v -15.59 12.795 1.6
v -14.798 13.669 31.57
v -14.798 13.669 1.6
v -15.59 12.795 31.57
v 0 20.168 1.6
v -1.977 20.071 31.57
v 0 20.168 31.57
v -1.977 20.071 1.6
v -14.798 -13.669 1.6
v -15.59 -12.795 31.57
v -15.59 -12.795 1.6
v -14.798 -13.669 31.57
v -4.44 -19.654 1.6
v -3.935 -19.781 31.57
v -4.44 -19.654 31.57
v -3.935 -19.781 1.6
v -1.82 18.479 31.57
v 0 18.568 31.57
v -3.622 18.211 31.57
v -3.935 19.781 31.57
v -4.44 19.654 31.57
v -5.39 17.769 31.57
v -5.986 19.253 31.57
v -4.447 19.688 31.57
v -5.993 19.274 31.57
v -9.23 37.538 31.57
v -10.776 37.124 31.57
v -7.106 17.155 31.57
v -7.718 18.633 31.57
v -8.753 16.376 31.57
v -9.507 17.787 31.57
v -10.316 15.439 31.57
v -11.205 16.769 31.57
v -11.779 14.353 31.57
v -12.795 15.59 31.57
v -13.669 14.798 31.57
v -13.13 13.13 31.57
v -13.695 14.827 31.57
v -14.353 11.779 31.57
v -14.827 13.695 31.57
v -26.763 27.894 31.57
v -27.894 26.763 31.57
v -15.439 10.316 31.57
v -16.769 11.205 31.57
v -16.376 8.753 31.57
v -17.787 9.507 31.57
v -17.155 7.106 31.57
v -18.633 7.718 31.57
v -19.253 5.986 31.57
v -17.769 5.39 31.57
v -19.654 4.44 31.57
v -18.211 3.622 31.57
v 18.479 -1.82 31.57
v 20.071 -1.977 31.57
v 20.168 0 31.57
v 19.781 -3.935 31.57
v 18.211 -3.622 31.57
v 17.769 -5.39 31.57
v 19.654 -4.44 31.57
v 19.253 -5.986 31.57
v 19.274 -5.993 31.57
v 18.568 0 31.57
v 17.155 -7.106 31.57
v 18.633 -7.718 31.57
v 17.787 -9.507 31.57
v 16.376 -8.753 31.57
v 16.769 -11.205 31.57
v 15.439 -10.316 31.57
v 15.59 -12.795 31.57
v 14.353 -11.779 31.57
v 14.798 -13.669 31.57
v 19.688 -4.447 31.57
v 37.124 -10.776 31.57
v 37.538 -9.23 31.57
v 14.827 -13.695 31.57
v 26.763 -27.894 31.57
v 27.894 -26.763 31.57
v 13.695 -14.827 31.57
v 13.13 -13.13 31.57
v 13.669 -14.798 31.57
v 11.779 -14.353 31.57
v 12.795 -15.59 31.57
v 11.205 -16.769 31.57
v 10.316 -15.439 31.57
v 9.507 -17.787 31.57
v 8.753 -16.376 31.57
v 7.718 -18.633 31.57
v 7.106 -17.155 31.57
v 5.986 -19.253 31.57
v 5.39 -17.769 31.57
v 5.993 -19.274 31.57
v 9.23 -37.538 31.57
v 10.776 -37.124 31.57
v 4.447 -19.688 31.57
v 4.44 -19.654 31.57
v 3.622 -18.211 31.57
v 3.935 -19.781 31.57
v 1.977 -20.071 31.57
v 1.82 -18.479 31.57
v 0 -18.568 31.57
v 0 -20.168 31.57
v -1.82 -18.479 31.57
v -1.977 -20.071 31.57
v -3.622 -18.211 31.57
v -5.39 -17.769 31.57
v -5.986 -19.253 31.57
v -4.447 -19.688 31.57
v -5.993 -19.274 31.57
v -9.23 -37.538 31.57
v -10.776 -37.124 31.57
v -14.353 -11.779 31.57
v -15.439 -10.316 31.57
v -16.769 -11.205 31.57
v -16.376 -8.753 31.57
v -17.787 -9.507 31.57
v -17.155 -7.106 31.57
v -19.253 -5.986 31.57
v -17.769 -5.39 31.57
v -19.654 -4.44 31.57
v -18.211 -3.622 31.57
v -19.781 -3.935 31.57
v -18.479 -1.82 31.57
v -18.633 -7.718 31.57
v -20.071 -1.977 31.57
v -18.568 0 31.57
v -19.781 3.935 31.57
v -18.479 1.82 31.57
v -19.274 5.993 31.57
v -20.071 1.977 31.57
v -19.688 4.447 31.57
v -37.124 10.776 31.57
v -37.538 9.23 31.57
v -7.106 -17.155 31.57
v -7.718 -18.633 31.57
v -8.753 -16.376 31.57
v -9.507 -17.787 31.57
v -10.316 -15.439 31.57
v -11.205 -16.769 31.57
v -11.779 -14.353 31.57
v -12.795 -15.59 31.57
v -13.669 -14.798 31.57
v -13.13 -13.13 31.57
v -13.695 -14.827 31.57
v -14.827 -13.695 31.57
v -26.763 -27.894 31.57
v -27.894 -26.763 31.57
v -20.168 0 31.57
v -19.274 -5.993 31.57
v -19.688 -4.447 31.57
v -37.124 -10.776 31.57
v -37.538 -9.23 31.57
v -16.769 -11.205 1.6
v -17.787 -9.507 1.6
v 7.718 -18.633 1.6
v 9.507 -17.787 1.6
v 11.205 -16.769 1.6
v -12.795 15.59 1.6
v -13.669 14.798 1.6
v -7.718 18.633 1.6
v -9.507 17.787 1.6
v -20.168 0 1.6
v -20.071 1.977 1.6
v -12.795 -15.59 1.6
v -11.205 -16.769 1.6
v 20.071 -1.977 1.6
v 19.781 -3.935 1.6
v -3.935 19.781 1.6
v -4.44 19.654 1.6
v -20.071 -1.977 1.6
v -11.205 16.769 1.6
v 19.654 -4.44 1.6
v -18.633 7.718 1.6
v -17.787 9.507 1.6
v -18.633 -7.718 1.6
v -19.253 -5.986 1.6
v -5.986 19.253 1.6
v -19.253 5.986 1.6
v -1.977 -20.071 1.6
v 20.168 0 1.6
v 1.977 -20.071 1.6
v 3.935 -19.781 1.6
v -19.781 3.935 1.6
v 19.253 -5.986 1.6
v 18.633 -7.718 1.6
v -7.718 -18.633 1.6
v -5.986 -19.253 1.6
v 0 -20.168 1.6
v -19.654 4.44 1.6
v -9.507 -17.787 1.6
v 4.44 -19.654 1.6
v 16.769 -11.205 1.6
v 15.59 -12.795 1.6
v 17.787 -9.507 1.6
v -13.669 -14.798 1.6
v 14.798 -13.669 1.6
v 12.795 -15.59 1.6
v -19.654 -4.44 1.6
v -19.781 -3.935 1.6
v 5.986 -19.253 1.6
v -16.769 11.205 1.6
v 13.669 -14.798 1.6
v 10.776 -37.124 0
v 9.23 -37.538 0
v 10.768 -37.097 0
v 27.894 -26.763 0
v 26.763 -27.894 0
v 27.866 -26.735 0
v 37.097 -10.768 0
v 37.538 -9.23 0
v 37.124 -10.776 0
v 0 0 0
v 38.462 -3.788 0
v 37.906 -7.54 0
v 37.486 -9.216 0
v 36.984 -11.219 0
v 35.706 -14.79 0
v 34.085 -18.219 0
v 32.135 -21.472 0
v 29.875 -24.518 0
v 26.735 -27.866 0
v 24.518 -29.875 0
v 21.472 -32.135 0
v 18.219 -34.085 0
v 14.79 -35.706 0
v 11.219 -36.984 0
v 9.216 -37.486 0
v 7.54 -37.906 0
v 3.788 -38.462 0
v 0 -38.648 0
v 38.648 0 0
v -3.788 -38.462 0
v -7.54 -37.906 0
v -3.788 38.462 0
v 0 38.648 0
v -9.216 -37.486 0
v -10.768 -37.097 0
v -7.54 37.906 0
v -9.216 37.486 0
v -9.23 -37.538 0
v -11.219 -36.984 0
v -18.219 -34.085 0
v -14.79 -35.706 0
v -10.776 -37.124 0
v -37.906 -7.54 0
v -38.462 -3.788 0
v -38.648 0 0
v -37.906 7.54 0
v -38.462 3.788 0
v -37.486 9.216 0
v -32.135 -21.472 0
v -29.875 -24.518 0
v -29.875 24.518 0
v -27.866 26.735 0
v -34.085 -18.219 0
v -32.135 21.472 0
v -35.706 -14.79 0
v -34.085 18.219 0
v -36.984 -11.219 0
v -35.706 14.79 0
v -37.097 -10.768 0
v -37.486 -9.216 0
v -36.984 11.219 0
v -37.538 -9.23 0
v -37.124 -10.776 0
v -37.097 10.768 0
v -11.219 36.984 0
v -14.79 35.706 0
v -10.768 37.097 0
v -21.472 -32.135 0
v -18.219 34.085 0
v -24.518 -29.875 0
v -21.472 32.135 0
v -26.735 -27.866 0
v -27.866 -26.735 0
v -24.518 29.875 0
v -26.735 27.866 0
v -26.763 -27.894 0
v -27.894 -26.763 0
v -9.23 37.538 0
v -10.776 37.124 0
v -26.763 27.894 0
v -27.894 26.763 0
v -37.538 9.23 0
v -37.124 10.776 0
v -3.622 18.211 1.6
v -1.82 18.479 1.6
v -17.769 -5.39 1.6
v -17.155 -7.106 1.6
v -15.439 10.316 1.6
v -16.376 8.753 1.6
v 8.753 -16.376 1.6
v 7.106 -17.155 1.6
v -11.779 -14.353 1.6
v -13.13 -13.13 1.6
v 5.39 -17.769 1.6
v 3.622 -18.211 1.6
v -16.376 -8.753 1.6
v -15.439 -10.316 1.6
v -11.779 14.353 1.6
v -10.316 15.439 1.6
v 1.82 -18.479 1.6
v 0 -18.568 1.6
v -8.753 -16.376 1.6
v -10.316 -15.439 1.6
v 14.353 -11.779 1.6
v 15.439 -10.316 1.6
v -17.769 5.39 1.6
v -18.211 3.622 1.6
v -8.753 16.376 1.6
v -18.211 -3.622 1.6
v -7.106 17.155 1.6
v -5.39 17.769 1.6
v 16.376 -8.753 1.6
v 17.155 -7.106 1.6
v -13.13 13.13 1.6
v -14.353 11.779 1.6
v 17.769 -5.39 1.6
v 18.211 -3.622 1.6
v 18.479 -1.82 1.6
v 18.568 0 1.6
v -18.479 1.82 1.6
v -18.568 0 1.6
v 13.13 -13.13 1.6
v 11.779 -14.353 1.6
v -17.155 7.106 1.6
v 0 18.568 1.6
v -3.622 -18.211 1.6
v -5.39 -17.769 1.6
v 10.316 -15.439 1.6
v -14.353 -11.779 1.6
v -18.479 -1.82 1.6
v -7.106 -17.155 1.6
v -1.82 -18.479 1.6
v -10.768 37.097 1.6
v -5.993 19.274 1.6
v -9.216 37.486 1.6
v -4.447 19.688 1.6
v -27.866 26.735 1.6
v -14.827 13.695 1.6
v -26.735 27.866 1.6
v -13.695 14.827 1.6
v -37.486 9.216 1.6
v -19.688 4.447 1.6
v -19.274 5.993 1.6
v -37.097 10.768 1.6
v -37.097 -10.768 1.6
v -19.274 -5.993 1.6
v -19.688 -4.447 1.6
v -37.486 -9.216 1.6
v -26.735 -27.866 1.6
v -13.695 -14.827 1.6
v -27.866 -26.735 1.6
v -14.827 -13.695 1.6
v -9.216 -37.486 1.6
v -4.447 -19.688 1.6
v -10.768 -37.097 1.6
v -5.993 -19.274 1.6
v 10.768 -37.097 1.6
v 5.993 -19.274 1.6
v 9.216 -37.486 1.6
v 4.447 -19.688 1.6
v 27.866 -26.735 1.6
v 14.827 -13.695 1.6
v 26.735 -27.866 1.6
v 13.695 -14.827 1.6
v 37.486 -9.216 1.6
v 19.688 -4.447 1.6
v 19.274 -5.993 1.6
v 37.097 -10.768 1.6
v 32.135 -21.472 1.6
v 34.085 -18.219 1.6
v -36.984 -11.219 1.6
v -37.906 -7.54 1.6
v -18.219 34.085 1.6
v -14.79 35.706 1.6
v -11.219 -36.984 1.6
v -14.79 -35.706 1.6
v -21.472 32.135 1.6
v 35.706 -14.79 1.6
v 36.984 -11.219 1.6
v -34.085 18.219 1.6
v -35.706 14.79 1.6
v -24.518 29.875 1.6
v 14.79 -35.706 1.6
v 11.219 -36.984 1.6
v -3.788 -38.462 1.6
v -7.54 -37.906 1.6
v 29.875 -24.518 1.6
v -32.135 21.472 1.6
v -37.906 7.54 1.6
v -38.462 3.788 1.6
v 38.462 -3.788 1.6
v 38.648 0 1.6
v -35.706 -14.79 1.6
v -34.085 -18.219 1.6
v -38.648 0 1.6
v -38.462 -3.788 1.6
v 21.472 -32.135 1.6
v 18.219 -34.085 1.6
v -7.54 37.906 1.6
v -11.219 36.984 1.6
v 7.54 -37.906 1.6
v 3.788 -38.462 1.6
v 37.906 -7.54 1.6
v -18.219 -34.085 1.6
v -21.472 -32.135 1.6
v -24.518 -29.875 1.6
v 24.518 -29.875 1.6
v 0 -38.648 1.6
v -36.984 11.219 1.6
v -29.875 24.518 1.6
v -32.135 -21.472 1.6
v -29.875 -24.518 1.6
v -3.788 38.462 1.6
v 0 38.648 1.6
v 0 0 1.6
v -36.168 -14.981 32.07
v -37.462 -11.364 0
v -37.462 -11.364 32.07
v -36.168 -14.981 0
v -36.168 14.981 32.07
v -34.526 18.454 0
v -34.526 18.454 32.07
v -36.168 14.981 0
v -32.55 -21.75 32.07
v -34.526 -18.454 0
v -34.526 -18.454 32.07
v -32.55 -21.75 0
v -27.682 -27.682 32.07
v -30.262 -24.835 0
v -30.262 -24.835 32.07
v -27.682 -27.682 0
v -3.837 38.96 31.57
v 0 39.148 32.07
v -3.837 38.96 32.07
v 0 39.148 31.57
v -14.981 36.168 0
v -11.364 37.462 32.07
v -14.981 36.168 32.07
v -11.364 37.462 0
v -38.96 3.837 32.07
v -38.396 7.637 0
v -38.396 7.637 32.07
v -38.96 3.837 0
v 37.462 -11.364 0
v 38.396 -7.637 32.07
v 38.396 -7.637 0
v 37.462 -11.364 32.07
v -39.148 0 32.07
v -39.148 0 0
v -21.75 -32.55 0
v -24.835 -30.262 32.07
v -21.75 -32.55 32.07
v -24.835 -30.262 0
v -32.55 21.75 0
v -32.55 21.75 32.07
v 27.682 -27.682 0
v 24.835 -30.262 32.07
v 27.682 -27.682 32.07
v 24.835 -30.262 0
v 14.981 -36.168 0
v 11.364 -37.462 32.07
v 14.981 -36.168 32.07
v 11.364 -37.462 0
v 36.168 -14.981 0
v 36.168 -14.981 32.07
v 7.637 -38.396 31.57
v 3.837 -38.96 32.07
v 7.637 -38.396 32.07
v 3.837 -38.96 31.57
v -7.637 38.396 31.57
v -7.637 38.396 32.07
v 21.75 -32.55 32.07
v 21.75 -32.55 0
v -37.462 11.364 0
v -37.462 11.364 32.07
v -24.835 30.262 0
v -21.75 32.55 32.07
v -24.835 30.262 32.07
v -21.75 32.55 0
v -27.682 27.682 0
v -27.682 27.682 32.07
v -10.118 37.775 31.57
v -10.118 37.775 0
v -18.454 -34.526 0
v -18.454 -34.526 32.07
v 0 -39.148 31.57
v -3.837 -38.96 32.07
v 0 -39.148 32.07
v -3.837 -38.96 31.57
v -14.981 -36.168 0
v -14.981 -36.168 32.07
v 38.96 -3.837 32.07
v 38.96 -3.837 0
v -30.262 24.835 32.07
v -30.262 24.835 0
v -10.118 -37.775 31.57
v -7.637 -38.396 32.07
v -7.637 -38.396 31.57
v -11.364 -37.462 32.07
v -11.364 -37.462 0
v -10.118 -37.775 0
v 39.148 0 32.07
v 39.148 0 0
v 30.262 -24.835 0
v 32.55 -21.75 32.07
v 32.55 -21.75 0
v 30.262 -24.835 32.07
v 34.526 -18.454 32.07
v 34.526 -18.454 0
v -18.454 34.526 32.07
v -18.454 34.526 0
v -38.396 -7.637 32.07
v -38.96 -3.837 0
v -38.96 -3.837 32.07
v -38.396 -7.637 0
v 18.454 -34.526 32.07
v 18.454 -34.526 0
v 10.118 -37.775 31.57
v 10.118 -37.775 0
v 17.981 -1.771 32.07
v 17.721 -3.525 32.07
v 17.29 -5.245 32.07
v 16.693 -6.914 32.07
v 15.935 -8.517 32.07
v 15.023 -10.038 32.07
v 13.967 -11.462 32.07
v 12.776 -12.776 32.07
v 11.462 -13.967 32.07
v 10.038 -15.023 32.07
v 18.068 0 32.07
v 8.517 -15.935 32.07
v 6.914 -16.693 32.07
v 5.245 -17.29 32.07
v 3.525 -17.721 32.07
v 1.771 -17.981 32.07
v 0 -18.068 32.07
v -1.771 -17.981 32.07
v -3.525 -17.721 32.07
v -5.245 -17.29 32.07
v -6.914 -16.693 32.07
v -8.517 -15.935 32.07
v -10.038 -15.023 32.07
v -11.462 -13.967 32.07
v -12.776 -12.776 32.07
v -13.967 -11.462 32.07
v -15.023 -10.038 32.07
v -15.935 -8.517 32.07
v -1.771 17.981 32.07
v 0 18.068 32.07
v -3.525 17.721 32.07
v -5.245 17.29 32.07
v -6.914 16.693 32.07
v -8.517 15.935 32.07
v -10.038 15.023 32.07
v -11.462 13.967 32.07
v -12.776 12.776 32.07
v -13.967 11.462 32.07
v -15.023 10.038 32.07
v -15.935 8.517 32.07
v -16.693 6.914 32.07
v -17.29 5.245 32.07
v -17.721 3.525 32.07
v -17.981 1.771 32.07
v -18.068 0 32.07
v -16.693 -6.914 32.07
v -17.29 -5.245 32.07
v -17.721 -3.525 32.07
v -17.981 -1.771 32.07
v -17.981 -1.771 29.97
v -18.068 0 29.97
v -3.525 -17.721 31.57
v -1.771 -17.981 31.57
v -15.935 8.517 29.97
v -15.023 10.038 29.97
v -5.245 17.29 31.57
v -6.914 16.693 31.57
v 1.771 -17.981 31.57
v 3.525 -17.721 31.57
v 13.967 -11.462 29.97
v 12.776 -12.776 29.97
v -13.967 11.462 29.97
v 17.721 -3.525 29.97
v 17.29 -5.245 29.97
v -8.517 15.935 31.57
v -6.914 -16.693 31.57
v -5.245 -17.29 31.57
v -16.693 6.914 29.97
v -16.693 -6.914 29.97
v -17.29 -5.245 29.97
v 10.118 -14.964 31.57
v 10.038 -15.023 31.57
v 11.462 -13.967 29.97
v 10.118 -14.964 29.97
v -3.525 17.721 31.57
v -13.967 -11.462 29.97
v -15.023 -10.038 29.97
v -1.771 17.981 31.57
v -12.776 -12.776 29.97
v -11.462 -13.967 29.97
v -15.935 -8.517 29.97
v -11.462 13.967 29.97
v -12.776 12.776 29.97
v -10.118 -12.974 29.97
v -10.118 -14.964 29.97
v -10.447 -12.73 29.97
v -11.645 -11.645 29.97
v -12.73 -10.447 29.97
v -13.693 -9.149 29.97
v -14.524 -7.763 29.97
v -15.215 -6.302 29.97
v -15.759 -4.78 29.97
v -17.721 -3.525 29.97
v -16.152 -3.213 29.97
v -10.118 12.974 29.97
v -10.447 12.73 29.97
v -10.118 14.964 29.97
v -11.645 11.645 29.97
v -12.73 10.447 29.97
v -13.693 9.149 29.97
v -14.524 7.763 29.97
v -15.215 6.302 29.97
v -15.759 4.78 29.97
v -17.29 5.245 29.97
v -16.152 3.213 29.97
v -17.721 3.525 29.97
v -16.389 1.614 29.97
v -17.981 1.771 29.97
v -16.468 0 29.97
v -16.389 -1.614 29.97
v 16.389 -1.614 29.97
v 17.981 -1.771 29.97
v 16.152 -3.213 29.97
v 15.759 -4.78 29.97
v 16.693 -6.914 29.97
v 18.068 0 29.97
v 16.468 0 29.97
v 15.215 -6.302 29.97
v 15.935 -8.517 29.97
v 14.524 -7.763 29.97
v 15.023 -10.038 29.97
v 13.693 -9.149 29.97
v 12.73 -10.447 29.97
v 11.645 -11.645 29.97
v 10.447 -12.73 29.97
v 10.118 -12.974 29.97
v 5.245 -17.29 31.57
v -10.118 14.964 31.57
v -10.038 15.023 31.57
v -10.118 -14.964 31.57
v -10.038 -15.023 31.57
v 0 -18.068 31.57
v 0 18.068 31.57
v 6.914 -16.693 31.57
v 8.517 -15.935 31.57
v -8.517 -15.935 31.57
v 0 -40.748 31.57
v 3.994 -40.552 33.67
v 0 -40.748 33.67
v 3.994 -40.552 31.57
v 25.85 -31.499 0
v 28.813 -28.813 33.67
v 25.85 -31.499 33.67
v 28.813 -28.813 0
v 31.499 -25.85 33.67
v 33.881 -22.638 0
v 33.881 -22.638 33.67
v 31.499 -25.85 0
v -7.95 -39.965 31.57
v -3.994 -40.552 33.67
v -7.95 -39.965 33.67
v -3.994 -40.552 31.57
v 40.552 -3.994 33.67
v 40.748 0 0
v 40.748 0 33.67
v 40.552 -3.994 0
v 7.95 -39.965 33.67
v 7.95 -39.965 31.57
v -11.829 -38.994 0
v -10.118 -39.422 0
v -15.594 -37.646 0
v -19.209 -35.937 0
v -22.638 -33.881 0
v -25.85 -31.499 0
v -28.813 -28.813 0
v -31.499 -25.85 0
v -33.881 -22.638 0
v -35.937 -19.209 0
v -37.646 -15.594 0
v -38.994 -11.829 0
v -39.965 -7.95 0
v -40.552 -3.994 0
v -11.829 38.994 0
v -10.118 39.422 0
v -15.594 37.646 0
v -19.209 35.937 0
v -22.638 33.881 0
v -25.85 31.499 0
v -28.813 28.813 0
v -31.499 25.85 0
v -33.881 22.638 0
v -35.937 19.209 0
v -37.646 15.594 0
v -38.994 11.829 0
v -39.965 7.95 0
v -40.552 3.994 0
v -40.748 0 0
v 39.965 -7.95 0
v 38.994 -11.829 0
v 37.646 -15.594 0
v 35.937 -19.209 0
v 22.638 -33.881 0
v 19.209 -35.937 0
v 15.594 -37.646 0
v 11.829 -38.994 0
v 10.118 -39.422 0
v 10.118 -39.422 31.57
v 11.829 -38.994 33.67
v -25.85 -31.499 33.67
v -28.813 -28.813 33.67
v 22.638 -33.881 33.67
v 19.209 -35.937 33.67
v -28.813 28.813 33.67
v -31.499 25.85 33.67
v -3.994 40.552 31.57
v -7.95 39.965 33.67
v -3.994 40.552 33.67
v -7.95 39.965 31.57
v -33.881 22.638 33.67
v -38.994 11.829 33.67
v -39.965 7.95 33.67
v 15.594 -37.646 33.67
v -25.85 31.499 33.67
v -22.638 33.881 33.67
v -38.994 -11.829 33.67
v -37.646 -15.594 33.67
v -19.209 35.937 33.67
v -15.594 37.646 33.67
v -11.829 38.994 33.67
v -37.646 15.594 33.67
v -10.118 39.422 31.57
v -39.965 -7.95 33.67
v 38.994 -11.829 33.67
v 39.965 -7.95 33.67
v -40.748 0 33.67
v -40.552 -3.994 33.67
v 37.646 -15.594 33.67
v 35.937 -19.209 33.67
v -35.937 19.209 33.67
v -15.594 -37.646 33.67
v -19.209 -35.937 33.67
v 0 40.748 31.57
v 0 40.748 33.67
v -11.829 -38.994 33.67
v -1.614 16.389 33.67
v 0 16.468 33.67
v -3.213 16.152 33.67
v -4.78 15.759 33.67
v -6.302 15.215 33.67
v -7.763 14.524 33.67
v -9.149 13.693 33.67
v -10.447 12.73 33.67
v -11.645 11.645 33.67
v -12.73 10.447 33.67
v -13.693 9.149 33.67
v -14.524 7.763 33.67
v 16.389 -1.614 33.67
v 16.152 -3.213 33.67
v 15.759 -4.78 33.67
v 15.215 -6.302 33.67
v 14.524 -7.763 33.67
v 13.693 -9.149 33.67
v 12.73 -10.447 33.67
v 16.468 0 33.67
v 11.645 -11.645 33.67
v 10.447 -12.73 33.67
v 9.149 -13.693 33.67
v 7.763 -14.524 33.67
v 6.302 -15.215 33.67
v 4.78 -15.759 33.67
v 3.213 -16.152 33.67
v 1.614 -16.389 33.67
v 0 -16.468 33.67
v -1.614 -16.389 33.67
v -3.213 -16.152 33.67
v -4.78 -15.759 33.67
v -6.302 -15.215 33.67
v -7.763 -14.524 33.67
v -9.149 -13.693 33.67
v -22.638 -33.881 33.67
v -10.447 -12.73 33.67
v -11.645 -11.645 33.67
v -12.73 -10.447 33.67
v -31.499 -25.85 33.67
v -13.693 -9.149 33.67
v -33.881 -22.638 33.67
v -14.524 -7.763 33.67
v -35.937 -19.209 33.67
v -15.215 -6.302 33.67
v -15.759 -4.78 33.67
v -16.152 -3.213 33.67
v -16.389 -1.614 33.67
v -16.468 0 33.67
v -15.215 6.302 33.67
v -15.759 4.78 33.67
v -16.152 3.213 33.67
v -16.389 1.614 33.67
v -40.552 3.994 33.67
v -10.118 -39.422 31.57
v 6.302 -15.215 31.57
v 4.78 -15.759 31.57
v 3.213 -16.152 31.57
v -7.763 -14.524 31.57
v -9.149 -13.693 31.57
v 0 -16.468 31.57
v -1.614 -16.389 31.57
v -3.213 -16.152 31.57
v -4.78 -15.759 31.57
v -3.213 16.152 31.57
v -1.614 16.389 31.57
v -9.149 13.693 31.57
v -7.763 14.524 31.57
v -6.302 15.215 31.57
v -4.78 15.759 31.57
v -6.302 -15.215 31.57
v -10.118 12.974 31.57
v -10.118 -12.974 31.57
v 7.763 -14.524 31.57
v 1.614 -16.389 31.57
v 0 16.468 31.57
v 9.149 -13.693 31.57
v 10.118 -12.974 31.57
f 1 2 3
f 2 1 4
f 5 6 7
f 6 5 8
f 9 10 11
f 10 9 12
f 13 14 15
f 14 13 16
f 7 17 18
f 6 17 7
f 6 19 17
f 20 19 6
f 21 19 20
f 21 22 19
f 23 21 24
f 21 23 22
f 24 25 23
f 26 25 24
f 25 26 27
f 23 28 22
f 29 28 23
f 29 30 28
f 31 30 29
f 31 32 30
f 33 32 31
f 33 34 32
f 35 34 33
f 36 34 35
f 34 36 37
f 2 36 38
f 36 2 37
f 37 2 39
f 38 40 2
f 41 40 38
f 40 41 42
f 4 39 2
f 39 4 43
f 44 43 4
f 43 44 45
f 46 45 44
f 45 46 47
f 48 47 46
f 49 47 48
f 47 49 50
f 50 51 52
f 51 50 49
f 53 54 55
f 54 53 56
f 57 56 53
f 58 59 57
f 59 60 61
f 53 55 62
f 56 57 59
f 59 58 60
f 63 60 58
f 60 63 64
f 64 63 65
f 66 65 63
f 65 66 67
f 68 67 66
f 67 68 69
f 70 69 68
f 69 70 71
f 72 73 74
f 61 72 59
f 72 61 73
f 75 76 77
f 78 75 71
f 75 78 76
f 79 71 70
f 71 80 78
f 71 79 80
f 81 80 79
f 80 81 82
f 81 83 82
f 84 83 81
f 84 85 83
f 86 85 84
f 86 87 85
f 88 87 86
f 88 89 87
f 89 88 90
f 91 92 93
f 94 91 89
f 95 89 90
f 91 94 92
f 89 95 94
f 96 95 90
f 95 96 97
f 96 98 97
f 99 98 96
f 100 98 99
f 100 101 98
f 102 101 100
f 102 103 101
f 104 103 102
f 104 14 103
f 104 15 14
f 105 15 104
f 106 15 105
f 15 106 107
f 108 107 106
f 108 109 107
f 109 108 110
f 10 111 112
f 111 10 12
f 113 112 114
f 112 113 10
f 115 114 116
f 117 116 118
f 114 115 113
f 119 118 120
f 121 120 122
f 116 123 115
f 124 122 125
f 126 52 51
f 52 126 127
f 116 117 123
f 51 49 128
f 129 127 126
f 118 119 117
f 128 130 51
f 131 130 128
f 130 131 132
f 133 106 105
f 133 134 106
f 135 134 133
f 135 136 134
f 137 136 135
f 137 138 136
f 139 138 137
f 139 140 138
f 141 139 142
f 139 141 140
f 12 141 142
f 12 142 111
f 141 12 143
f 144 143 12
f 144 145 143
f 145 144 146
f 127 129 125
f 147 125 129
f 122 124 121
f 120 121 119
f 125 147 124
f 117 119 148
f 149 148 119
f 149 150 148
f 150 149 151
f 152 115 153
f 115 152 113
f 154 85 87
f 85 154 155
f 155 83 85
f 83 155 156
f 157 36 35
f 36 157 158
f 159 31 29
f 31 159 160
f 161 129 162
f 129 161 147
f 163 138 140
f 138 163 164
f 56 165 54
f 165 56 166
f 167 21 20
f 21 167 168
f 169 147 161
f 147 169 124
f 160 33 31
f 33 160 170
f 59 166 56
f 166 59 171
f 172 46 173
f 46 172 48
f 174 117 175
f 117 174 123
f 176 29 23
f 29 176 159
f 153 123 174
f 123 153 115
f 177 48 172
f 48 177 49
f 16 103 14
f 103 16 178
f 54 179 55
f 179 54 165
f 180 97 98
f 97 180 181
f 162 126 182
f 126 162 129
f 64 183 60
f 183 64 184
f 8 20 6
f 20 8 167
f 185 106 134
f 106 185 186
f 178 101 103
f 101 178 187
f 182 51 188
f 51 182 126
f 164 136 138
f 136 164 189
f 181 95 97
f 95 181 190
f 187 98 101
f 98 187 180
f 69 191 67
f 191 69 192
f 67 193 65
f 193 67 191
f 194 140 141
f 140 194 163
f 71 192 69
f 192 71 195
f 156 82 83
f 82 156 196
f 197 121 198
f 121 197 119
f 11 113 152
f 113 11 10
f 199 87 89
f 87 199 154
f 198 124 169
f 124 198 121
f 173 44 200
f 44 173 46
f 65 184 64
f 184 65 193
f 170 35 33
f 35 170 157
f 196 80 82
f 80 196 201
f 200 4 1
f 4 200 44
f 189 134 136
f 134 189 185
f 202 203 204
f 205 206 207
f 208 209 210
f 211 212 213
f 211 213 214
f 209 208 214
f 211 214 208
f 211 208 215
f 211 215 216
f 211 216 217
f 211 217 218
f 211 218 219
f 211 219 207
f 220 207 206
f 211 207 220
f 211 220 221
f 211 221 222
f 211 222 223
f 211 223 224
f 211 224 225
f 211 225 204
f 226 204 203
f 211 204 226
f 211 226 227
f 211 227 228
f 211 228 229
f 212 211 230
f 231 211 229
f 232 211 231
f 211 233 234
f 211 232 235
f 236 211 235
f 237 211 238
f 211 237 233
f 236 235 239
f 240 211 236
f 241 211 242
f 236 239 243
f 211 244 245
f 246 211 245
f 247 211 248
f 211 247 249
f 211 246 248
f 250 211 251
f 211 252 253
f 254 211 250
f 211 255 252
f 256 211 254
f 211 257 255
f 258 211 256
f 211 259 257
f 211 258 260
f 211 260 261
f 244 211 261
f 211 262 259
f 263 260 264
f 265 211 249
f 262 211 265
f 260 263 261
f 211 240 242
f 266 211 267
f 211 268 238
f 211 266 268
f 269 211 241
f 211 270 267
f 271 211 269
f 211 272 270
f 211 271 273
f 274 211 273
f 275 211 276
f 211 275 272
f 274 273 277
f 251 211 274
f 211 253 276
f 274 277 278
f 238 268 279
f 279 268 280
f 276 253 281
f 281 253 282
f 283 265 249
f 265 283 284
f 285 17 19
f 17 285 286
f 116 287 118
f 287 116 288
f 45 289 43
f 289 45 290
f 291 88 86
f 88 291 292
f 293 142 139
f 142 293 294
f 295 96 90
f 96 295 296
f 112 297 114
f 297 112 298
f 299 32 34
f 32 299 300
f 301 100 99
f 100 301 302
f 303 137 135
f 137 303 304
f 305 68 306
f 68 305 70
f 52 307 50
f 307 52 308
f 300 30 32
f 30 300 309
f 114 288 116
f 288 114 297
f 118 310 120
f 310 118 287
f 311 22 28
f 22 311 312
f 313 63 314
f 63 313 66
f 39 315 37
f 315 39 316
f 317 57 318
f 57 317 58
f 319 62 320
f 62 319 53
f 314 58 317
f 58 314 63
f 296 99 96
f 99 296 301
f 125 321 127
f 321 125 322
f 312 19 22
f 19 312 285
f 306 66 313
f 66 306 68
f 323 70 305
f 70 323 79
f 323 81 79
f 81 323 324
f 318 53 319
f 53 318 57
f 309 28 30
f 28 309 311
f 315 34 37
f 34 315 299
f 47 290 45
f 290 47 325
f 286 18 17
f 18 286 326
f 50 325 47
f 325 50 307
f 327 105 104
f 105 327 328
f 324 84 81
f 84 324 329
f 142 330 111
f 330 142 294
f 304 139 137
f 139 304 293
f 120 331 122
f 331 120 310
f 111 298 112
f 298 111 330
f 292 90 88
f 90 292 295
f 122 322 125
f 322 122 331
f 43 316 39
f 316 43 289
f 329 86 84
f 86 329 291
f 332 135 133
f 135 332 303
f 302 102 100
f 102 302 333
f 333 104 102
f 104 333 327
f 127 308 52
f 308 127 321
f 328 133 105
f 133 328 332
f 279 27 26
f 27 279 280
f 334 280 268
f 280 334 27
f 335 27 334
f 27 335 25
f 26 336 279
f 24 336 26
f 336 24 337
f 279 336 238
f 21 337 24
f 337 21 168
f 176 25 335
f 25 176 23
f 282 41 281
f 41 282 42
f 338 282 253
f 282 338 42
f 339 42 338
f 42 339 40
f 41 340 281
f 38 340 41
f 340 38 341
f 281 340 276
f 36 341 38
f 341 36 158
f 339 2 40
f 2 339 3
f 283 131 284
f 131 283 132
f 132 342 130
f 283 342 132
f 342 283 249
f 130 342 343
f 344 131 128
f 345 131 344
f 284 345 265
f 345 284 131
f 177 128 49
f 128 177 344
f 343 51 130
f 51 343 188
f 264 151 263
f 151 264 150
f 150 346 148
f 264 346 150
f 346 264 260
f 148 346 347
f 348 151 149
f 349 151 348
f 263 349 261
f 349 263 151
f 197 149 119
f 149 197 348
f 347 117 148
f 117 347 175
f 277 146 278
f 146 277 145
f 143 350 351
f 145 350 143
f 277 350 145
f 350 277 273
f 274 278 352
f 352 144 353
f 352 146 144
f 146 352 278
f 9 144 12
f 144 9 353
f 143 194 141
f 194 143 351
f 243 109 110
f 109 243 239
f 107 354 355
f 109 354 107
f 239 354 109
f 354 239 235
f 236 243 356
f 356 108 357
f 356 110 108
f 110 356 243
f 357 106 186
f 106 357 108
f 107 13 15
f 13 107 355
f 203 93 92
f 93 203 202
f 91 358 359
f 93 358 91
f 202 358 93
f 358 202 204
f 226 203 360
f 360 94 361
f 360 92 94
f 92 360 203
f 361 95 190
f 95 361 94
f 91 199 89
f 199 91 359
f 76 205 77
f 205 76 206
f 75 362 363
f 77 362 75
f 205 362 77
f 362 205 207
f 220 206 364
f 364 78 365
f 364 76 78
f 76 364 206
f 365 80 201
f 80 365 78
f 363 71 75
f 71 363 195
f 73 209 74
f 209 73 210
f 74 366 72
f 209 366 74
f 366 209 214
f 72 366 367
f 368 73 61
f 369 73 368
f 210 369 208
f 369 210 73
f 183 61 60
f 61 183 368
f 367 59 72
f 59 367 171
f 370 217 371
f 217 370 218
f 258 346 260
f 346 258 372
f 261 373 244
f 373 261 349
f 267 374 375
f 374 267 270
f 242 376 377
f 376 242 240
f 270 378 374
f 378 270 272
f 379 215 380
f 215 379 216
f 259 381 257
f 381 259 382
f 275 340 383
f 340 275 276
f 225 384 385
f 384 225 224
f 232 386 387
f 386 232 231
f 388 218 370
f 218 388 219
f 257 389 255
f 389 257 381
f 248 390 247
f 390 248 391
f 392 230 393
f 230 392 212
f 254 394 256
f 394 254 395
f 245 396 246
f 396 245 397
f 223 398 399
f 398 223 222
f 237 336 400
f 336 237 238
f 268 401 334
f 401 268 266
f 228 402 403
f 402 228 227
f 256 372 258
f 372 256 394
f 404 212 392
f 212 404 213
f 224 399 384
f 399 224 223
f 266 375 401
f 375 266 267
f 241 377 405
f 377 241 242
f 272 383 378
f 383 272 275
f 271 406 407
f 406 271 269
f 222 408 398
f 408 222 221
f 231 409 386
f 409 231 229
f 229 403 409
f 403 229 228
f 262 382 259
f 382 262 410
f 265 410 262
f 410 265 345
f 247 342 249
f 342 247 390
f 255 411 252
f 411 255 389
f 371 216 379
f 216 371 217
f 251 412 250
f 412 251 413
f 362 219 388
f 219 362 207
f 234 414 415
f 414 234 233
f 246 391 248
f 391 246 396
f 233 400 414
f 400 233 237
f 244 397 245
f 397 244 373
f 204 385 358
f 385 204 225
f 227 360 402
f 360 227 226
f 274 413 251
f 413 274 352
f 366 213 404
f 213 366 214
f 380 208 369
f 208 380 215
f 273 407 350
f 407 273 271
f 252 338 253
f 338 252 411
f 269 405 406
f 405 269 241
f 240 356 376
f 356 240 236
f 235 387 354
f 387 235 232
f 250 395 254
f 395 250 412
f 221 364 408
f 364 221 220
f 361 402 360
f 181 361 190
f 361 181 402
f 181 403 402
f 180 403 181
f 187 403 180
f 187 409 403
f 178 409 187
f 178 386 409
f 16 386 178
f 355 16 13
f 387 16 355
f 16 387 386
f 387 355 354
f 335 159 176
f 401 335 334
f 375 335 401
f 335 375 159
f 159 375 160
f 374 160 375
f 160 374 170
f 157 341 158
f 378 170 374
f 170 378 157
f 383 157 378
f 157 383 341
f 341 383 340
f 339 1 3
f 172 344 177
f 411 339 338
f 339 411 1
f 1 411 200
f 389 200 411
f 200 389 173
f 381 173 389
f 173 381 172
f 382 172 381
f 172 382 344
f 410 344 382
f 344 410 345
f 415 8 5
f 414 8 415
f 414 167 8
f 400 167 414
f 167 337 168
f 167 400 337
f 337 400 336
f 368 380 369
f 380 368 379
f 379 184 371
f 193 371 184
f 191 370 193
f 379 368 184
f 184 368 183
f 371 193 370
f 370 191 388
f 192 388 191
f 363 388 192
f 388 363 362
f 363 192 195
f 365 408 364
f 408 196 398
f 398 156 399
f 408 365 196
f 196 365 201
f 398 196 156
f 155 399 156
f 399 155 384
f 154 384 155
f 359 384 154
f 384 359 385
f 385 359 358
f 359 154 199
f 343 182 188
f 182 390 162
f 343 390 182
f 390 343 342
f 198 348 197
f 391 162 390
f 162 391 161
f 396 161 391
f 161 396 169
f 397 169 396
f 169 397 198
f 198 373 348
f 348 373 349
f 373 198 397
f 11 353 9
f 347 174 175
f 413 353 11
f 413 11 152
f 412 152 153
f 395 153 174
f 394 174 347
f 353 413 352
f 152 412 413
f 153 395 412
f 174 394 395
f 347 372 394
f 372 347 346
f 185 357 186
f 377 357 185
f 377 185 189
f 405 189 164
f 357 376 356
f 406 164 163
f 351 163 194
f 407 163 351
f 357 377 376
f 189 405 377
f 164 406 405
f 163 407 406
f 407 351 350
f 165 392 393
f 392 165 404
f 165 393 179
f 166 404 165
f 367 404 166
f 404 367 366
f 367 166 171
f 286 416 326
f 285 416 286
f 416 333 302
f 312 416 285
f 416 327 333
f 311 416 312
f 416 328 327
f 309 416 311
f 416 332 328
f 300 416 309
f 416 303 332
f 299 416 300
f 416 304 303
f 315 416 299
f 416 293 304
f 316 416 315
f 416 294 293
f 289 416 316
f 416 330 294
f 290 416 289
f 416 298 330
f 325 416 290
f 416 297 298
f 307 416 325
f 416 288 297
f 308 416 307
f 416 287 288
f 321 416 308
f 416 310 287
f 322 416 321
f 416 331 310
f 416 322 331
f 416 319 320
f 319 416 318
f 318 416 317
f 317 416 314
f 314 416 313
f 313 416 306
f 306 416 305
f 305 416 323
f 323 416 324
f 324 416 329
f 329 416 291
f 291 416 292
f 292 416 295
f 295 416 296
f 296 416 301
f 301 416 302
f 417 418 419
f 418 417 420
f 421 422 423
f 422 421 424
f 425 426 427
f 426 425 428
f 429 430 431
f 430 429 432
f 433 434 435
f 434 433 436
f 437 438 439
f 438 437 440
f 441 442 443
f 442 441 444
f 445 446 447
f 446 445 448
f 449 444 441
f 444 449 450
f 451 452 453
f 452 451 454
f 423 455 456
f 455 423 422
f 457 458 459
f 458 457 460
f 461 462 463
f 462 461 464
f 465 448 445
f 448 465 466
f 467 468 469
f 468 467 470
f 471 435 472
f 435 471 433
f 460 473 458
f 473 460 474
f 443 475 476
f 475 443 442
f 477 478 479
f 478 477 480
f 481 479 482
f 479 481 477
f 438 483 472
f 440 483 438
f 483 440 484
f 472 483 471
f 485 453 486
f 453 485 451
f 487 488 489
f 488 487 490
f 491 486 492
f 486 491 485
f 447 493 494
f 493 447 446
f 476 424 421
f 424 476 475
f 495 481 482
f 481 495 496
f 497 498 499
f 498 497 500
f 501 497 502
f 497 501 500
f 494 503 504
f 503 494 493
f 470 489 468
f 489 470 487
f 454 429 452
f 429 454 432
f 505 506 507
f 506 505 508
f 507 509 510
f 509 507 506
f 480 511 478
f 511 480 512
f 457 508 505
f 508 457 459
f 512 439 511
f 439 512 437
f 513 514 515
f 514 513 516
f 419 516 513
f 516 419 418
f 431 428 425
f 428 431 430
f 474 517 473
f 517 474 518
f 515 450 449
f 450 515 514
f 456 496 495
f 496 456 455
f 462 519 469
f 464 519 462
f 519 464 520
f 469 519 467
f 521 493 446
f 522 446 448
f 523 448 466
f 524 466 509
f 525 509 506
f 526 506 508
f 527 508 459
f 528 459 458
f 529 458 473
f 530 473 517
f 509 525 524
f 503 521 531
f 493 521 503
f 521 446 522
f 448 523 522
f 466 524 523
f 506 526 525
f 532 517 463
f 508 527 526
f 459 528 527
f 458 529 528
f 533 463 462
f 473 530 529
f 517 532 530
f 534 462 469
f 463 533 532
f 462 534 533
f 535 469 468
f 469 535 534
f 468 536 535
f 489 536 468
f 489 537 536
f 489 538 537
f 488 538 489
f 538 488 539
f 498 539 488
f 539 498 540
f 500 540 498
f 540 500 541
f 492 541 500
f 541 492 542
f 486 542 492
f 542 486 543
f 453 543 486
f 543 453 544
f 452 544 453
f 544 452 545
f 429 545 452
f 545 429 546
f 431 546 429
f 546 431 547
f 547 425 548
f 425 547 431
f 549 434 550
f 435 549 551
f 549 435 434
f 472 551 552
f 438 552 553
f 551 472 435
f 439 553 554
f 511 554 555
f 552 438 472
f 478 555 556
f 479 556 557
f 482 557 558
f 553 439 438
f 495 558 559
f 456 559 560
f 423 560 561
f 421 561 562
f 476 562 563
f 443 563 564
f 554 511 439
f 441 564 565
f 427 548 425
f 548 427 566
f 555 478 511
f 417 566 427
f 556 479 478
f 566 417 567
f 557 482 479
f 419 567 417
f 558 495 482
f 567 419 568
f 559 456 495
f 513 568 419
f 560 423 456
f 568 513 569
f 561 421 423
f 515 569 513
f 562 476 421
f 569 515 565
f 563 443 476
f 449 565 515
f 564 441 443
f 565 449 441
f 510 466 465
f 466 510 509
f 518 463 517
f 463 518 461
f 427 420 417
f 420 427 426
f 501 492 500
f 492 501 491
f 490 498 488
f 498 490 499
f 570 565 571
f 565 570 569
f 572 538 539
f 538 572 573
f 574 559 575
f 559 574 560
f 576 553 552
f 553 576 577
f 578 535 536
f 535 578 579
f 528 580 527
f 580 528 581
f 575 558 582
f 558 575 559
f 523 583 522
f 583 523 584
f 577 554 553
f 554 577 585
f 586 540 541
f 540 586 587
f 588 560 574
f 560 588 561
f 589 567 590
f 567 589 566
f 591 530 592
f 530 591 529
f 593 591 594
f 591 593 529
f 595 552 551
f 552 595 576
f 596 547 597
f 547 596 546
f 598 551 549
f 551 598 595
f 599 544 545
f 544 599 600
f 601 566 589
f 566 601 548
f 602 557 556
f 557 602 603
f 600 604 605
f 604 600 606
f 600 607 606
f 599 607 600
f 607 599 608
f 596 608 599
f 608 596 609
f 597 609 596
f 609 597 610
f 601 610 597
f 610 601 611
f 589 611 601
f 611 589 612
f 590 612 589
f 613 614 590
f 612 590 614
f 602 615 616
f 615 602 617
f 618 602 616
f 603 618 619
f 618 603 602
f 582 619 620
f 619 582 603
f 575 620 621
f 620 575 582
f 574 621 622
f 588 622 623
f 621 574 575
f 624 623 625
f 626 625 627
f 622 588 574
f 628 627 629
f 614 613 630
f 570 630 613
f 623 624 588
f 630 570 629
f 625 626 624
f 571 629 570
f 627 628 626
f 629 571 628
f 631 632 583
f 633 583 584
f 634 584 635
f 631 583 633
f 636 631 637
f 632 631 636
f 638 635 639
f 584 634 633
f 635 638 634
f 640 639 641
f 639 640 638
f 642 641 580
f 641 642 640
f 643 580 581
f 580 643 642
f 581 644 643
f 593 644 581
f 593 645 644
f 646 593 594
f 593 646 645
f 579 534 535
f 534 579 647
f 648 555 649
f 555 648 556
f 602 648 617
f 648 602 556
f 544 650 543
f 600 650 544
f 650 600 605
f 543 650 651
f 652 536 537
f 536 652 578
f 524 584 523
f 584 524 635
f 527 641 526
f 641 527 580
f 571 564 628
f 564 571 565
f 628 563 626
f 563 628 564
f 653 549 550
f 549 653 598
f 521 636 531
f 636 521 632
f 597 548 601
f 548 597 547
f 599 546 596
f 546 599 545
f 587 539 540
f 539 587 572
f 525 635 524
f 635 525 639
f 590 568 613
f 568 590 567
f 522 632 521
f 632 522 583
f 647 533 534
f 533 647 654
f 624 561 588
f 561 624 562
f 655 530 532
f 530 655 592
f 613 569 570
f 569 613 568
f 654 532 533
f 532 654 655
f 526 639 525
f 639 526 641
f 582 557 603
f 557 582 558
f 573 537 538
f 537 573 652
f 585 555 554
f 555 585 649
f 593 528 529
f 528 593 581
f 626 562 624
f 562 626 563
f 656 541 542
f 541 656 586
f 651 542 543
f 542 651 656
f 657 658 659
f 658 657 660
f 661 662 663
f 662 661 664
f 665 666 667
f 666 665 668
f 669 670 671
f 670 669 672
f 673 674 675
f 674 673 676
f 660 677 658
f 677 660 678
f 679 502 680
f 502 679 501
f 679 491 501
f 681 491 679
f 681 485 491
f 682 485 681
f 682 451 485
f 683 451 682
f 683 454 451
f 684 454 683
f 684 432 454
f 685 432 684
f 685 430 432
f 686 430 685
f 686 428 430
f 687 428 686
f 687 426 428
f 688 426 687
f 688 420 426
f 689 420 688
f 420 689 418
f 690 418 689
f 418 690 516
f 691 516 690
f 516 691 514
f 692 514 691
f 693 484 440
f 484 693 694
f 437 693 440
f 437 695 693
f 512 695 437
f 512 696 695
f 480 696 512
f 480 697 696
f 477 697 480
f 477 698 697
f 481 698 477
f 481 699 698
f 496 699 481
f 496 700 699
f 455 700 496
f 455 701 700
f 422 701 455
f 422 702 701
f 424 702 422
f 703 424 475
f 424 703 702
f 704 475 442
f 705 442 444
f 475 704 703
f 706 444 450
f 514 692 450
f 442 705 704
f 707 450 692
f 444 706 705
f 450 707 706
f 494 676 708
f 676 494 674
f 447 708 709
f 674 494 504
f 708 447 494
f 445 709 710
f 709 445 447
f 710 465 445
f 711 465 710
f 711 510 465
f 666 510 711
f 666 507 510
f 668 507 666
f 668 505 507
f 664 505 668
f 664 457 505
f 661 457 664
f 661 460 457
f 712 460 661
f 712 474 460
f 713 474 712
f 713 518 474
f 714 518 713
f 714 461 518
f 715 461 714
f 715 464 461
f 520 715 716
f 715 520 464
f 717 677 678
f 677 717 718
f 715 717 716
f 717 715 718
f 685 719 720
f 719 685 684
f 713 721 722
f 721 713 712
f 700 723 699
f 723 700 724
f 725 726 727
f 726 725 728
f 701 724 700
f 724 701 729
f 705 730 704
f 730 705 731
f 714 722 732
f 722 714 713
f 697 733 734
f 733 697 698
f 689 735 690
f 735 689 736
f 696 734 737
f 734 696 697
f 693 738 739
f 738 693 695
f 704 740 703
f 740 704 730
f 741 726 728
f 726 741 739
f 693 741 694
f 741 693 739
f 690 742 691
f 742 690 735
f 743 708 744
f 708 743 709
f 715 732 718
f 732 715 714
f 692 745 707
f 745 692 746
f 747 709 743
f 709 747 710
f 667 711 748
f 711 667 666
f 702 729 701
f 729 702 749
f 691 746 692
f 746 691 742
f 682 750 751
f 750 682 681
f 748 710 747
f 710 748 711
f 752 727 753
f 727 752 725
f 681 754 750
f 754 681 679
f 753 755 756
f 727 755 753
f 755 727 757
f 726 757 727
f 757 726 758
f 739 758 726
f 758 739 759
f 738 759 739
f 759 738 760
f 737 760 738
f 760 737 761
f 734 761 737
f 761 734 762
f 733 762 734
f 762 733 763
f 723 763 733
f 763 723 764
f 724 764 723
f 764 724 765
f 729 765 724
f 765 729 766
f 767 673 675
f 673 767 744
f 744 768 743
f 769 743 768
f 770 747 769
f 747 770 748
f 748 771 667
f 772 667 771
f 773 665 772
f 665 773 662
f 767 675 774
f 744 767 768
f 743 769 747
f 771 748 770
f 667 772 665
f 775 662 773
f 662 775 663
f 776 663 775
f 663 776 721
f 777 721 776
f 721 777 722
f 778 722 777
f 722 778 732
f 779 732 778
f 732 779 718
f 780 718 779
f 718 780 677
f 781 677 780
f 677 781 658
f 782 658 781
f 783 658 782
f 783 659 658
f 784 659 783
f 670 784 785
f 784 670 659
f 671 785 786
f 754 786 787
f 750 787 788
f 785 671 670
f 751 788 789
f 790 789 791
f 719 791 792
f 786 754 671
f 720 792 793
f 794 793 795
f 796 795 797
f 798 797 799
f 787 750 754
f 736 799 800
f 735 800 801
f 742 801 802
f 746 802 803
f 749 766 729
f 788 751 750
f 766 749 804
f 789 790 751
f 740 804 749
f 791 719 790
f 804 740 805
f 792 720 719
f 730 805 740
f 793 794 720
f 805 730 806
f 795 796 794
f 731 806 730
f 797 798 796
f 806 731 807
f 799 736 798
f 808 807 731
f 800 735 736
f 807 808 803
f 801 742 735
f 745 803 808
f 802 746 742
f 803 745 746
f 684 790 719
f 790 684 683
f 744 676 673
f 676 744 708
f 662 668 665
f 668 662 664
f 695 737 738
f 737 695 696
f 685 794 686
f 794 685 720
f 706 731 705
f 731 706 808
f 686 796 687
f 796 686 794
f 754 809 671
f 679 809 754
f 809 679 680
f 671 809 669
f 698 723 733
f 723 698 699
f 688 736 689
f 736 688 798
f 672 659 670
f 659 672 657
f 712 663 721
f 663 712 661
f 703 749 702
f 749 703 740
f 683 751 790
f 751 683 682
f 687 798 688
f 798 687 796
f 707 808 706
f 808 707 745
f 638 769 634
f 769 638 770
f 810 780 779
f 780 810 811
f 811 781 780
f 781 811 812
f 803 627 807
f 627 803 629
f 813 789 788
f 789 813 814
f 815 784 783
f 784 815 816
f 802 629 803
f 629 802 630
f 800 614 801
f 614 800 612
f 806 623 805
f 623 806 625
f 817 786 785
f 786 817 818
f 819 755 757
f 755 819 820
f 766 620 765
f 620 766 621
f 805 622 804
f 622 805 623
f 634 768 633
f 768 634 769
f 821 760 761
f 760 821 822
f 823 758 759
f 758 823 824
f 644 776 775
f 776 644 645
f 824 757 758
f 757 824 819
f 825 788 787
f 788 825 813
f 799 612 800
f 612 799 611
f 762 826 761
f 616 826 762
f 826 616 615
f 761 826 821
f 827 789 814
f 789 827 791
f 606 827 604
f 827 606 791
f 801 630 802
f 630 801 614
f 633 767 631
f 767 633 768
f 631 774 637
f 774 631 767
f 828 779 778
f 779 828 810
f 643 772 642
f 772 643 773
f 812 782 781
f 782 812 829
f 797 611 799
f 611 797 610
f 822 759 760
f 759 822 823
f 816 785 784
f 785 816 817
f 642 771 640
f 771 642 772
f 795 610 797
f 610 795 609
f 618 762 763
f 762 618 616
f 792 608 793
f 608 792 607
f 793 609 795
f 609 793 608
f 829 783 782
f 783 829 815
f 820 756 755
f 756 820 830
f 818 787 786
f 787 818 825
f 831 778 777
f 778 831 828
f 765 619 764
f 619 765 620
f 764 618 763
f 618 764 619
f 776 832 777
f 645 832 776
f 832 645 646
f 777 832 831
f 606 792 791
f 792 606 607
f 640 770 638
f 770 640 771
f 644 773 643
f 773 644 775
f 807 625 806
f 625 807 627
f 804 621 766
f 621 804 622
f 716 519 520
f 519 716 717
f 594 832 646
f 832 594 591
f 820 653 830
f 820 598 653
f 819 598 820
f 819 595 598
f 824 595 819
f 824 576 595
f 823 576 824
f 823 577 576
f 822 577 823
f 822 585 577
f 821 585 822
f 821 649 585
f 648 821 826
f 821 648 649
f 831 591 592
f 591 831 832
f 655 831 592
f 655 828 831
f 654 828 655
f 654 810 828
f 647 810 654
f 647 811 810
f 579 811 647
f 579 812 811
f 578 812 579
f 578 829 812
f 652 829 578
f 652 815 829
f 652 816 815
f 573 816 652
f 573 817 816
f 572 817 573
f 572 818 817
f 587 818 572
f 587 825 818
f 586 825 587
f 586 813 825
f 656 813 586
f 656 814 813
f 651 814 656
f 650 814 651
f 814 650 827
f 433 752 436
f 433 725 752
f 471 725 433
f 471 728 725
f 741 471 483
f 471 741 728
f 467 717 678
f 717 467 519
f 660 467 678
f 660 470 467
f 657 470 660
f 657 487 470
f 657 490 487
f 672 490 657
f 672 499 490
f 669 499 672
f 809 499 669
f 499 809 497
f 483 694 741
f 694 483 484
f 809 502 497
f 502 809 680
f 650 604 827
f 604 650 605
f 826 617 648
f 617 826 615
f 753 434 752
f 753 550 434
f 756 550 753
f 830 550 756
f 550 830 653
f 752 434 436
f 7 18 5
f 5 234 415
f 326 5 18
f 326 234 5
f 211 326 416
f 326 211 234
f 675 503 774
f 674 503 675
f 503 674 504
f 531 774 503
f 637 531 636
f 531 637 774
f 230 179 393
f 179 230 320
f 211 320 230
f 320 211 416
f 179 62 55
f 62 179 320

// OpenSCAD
// file: 9g_servo.scad
//9g_motor();

//function    

function servo_9g_dim() =     [12.5,15.5,23+1];
function servo_9g_hole_off()=(27.4-servo_9g_dim()[2])/2;
function servo_9g_pin_off() = [23/2,12.5/2*0,22/2]+[5.5,0,3.65];

module 9g_motor(){
	translate([23/2,12.5/2*0,22/2])
//	translate([23/2,12.5/2,22/2])
	difference(){			
		union(){
			color("lightblue") cube([23,12.5,22], center=true);
			color("lightblue") translate([0,0,5]) cube([32,12,2], center=true);
			color("lightblue") translate([5.5,0,2.75]) cylinder(r=6, h=25.75, $fn=20, center=true);
			color("lightblue") translate([-.5,0,2.75]) cylinder(r=1, h=25.75, $fn=20, center=true);
			color("lightblue") translate([-1,0,2.75]) cube([5,5.6,24.5], center=true);		
			color("white") translate([5.5,0,3.65]) cylinder(r=2.35, h=29.25, $fn=20, center=true);		
          translate([10,0,-10+4.7])  
            color("red") cube([10,5,2],center=true);
		}
		translate([10,0,-11]) rotate([0,-30,0]) cube([8,13,4], center=true);
		for ( hole = [14,-14] ){
			translate([hole,0,5]) cylinder(r=2.2, h=4, $fn=20, center=true);
		}
	}
}

9g_motor();
// file: syms.scad
module symY(t) {
    translate(t)
        children();
    mirror([0,1,0])
        translate(t)
            children();
}
module symX(t) {
    translate(t)
        children();
    mirror([1,0,0])
        translate(t)
            children();
}

module symZ(t) {
    translate(t)
        children();
    mirror([0,0,1])
        translate(t)
            children();
}

module	symXY(t) {
	tx=t[0];
	ty=t[1];
	tz=t[2];
	symX([tx,0,0])
	symY([0,ty,tz])
		children();
}

module magnetCut(D,S) {
    cylinder(d=D,h=10);
    for(d=[45,-45])
    rotate(d)
    cube([2*D,S,30],center=true);
}


// calculates the radius from "segment" paramers:
// https://en.wikipedia.org/wiki/Circular_segment
function    circleSlice2radius2(c,h) = (c*c/8/h)+ h/2;

function toInt(str) = 
    let(d = [for (s = str) ord(s) - 48], l = len(d) - 1)
    [for (i = 0, a = d[i];i <= l;i = i + 1, a = 10 * a + d[i]) a][l];
        
// main file
use <syms.scad>
use <9g_servo.scad>

//MAOAM_DIMS=[27.7,8.6,15.8]+[1,1,1];
MAOAM_DIMS=[8.6,15.8,27.7]+[1,1,1];
W=1.6;
EPS=3e-3;
CAPACITY=12;

OVERSCALE=1.1;

C_R1=CAPACITY*MAOAM_DIMS[0]*OVERSCALE/PI/2;
C_R2=C_R1+MAOAM_DIMS[1]*OVERSCALE;

WHEEL_H=MAOAM_DIMS[2]*OVERSCALE;

module hullPairs(pos){
    for(i=[0:len(pos)-2]){
        hull() {
            translate(pos[i+0]) children();
            translate(pos[i+1]) children();
        }
    }
    
}
     $fn=64;

module wheel() {
    
    cylinder(r=C_R2,h=W);
    difference() {
        cylinder(r=C_R1,h=WHEEL_H);
        cylinder(r=C_R1-W,h=WHEEL_H*3,center=true);
    }
    
    for(i=[0:360/CAPACITY:360-EPS]) {
        rotate(i+360/CAPACITY/2) {
            hull() {
                translate([C_R1,0,0]) cylinder(d=W,h=WHEEL_H);
                translate([C_R2-W/2,0,WHEEL_H/2]) cube([W,W,WHEEL_H],center=true);
            }
%            translate([C_R1,0,0])
            rotate(-90)
            rotate(-360/2/CAPACITY)
            cube(MAOAM_DIMS);
        }
    }

}

CL=.5;

module cover() {
    PORT_W=C_R2*2*PI/CAPACITY;
    difference() {
        cylinder(r=C_R2+CL+W,h=WHEEL_H+CL+W);
        
        // main cut
        translate([0,0,-W])
        difference() {
            cylinder(r=C_R2+CL,h=WHEEL_H+CL+W);
            // cut into top piece a bit
            translate([0,0,WHEEL_H])
            cylinder(r=C_R1-W-CL,h=WHEEL_H+CL+W);
        }
        
        // center cut
        translate([0,0,-W])
        cylinder(r=C_R1-W-CL-W,h=2*WHEEL_H);
        
        // cut ports
        cube([PORT_W,1000,2*WHEEL_H],center=true);
    }
}


module dispenserPart2() {
    
    difference() {
        union() {
            intersection() {
                rotate(-90,[1,0,0])
                cylinder(d=25,h=20,center=true);
                
            }
            rotate(-90,[1,0,0])
            cylinder(d=25,h=3.6+W);

            rotate(-90,[1,0,0])
            cylinder(d1=40,d2=35,h=3);

        }
            rotate(-90,[1,0,0])
            cylinder(d=23,h=50);
    }
}


mode="preview";
if(mode=="preview") {
    difference() {
        union() {
            wheel();
            cover();
        }
        translate([0,0,-W])
        cube(100);
    }
}

if(mode=="storage") {
    storage2();
}
if(mode=="dispenser") {
    dispenserPart();
}
if(mode=="hole") {
    rotate(-90,[1,0,0])
    dispenserPart2();
}
if(mode=="arm") {
    arm();
}
if(mode=="top"){
    cube([MAOAM_DIMS[0],MAOAM_DIMS[1],0]+[W,W,W]);
}
